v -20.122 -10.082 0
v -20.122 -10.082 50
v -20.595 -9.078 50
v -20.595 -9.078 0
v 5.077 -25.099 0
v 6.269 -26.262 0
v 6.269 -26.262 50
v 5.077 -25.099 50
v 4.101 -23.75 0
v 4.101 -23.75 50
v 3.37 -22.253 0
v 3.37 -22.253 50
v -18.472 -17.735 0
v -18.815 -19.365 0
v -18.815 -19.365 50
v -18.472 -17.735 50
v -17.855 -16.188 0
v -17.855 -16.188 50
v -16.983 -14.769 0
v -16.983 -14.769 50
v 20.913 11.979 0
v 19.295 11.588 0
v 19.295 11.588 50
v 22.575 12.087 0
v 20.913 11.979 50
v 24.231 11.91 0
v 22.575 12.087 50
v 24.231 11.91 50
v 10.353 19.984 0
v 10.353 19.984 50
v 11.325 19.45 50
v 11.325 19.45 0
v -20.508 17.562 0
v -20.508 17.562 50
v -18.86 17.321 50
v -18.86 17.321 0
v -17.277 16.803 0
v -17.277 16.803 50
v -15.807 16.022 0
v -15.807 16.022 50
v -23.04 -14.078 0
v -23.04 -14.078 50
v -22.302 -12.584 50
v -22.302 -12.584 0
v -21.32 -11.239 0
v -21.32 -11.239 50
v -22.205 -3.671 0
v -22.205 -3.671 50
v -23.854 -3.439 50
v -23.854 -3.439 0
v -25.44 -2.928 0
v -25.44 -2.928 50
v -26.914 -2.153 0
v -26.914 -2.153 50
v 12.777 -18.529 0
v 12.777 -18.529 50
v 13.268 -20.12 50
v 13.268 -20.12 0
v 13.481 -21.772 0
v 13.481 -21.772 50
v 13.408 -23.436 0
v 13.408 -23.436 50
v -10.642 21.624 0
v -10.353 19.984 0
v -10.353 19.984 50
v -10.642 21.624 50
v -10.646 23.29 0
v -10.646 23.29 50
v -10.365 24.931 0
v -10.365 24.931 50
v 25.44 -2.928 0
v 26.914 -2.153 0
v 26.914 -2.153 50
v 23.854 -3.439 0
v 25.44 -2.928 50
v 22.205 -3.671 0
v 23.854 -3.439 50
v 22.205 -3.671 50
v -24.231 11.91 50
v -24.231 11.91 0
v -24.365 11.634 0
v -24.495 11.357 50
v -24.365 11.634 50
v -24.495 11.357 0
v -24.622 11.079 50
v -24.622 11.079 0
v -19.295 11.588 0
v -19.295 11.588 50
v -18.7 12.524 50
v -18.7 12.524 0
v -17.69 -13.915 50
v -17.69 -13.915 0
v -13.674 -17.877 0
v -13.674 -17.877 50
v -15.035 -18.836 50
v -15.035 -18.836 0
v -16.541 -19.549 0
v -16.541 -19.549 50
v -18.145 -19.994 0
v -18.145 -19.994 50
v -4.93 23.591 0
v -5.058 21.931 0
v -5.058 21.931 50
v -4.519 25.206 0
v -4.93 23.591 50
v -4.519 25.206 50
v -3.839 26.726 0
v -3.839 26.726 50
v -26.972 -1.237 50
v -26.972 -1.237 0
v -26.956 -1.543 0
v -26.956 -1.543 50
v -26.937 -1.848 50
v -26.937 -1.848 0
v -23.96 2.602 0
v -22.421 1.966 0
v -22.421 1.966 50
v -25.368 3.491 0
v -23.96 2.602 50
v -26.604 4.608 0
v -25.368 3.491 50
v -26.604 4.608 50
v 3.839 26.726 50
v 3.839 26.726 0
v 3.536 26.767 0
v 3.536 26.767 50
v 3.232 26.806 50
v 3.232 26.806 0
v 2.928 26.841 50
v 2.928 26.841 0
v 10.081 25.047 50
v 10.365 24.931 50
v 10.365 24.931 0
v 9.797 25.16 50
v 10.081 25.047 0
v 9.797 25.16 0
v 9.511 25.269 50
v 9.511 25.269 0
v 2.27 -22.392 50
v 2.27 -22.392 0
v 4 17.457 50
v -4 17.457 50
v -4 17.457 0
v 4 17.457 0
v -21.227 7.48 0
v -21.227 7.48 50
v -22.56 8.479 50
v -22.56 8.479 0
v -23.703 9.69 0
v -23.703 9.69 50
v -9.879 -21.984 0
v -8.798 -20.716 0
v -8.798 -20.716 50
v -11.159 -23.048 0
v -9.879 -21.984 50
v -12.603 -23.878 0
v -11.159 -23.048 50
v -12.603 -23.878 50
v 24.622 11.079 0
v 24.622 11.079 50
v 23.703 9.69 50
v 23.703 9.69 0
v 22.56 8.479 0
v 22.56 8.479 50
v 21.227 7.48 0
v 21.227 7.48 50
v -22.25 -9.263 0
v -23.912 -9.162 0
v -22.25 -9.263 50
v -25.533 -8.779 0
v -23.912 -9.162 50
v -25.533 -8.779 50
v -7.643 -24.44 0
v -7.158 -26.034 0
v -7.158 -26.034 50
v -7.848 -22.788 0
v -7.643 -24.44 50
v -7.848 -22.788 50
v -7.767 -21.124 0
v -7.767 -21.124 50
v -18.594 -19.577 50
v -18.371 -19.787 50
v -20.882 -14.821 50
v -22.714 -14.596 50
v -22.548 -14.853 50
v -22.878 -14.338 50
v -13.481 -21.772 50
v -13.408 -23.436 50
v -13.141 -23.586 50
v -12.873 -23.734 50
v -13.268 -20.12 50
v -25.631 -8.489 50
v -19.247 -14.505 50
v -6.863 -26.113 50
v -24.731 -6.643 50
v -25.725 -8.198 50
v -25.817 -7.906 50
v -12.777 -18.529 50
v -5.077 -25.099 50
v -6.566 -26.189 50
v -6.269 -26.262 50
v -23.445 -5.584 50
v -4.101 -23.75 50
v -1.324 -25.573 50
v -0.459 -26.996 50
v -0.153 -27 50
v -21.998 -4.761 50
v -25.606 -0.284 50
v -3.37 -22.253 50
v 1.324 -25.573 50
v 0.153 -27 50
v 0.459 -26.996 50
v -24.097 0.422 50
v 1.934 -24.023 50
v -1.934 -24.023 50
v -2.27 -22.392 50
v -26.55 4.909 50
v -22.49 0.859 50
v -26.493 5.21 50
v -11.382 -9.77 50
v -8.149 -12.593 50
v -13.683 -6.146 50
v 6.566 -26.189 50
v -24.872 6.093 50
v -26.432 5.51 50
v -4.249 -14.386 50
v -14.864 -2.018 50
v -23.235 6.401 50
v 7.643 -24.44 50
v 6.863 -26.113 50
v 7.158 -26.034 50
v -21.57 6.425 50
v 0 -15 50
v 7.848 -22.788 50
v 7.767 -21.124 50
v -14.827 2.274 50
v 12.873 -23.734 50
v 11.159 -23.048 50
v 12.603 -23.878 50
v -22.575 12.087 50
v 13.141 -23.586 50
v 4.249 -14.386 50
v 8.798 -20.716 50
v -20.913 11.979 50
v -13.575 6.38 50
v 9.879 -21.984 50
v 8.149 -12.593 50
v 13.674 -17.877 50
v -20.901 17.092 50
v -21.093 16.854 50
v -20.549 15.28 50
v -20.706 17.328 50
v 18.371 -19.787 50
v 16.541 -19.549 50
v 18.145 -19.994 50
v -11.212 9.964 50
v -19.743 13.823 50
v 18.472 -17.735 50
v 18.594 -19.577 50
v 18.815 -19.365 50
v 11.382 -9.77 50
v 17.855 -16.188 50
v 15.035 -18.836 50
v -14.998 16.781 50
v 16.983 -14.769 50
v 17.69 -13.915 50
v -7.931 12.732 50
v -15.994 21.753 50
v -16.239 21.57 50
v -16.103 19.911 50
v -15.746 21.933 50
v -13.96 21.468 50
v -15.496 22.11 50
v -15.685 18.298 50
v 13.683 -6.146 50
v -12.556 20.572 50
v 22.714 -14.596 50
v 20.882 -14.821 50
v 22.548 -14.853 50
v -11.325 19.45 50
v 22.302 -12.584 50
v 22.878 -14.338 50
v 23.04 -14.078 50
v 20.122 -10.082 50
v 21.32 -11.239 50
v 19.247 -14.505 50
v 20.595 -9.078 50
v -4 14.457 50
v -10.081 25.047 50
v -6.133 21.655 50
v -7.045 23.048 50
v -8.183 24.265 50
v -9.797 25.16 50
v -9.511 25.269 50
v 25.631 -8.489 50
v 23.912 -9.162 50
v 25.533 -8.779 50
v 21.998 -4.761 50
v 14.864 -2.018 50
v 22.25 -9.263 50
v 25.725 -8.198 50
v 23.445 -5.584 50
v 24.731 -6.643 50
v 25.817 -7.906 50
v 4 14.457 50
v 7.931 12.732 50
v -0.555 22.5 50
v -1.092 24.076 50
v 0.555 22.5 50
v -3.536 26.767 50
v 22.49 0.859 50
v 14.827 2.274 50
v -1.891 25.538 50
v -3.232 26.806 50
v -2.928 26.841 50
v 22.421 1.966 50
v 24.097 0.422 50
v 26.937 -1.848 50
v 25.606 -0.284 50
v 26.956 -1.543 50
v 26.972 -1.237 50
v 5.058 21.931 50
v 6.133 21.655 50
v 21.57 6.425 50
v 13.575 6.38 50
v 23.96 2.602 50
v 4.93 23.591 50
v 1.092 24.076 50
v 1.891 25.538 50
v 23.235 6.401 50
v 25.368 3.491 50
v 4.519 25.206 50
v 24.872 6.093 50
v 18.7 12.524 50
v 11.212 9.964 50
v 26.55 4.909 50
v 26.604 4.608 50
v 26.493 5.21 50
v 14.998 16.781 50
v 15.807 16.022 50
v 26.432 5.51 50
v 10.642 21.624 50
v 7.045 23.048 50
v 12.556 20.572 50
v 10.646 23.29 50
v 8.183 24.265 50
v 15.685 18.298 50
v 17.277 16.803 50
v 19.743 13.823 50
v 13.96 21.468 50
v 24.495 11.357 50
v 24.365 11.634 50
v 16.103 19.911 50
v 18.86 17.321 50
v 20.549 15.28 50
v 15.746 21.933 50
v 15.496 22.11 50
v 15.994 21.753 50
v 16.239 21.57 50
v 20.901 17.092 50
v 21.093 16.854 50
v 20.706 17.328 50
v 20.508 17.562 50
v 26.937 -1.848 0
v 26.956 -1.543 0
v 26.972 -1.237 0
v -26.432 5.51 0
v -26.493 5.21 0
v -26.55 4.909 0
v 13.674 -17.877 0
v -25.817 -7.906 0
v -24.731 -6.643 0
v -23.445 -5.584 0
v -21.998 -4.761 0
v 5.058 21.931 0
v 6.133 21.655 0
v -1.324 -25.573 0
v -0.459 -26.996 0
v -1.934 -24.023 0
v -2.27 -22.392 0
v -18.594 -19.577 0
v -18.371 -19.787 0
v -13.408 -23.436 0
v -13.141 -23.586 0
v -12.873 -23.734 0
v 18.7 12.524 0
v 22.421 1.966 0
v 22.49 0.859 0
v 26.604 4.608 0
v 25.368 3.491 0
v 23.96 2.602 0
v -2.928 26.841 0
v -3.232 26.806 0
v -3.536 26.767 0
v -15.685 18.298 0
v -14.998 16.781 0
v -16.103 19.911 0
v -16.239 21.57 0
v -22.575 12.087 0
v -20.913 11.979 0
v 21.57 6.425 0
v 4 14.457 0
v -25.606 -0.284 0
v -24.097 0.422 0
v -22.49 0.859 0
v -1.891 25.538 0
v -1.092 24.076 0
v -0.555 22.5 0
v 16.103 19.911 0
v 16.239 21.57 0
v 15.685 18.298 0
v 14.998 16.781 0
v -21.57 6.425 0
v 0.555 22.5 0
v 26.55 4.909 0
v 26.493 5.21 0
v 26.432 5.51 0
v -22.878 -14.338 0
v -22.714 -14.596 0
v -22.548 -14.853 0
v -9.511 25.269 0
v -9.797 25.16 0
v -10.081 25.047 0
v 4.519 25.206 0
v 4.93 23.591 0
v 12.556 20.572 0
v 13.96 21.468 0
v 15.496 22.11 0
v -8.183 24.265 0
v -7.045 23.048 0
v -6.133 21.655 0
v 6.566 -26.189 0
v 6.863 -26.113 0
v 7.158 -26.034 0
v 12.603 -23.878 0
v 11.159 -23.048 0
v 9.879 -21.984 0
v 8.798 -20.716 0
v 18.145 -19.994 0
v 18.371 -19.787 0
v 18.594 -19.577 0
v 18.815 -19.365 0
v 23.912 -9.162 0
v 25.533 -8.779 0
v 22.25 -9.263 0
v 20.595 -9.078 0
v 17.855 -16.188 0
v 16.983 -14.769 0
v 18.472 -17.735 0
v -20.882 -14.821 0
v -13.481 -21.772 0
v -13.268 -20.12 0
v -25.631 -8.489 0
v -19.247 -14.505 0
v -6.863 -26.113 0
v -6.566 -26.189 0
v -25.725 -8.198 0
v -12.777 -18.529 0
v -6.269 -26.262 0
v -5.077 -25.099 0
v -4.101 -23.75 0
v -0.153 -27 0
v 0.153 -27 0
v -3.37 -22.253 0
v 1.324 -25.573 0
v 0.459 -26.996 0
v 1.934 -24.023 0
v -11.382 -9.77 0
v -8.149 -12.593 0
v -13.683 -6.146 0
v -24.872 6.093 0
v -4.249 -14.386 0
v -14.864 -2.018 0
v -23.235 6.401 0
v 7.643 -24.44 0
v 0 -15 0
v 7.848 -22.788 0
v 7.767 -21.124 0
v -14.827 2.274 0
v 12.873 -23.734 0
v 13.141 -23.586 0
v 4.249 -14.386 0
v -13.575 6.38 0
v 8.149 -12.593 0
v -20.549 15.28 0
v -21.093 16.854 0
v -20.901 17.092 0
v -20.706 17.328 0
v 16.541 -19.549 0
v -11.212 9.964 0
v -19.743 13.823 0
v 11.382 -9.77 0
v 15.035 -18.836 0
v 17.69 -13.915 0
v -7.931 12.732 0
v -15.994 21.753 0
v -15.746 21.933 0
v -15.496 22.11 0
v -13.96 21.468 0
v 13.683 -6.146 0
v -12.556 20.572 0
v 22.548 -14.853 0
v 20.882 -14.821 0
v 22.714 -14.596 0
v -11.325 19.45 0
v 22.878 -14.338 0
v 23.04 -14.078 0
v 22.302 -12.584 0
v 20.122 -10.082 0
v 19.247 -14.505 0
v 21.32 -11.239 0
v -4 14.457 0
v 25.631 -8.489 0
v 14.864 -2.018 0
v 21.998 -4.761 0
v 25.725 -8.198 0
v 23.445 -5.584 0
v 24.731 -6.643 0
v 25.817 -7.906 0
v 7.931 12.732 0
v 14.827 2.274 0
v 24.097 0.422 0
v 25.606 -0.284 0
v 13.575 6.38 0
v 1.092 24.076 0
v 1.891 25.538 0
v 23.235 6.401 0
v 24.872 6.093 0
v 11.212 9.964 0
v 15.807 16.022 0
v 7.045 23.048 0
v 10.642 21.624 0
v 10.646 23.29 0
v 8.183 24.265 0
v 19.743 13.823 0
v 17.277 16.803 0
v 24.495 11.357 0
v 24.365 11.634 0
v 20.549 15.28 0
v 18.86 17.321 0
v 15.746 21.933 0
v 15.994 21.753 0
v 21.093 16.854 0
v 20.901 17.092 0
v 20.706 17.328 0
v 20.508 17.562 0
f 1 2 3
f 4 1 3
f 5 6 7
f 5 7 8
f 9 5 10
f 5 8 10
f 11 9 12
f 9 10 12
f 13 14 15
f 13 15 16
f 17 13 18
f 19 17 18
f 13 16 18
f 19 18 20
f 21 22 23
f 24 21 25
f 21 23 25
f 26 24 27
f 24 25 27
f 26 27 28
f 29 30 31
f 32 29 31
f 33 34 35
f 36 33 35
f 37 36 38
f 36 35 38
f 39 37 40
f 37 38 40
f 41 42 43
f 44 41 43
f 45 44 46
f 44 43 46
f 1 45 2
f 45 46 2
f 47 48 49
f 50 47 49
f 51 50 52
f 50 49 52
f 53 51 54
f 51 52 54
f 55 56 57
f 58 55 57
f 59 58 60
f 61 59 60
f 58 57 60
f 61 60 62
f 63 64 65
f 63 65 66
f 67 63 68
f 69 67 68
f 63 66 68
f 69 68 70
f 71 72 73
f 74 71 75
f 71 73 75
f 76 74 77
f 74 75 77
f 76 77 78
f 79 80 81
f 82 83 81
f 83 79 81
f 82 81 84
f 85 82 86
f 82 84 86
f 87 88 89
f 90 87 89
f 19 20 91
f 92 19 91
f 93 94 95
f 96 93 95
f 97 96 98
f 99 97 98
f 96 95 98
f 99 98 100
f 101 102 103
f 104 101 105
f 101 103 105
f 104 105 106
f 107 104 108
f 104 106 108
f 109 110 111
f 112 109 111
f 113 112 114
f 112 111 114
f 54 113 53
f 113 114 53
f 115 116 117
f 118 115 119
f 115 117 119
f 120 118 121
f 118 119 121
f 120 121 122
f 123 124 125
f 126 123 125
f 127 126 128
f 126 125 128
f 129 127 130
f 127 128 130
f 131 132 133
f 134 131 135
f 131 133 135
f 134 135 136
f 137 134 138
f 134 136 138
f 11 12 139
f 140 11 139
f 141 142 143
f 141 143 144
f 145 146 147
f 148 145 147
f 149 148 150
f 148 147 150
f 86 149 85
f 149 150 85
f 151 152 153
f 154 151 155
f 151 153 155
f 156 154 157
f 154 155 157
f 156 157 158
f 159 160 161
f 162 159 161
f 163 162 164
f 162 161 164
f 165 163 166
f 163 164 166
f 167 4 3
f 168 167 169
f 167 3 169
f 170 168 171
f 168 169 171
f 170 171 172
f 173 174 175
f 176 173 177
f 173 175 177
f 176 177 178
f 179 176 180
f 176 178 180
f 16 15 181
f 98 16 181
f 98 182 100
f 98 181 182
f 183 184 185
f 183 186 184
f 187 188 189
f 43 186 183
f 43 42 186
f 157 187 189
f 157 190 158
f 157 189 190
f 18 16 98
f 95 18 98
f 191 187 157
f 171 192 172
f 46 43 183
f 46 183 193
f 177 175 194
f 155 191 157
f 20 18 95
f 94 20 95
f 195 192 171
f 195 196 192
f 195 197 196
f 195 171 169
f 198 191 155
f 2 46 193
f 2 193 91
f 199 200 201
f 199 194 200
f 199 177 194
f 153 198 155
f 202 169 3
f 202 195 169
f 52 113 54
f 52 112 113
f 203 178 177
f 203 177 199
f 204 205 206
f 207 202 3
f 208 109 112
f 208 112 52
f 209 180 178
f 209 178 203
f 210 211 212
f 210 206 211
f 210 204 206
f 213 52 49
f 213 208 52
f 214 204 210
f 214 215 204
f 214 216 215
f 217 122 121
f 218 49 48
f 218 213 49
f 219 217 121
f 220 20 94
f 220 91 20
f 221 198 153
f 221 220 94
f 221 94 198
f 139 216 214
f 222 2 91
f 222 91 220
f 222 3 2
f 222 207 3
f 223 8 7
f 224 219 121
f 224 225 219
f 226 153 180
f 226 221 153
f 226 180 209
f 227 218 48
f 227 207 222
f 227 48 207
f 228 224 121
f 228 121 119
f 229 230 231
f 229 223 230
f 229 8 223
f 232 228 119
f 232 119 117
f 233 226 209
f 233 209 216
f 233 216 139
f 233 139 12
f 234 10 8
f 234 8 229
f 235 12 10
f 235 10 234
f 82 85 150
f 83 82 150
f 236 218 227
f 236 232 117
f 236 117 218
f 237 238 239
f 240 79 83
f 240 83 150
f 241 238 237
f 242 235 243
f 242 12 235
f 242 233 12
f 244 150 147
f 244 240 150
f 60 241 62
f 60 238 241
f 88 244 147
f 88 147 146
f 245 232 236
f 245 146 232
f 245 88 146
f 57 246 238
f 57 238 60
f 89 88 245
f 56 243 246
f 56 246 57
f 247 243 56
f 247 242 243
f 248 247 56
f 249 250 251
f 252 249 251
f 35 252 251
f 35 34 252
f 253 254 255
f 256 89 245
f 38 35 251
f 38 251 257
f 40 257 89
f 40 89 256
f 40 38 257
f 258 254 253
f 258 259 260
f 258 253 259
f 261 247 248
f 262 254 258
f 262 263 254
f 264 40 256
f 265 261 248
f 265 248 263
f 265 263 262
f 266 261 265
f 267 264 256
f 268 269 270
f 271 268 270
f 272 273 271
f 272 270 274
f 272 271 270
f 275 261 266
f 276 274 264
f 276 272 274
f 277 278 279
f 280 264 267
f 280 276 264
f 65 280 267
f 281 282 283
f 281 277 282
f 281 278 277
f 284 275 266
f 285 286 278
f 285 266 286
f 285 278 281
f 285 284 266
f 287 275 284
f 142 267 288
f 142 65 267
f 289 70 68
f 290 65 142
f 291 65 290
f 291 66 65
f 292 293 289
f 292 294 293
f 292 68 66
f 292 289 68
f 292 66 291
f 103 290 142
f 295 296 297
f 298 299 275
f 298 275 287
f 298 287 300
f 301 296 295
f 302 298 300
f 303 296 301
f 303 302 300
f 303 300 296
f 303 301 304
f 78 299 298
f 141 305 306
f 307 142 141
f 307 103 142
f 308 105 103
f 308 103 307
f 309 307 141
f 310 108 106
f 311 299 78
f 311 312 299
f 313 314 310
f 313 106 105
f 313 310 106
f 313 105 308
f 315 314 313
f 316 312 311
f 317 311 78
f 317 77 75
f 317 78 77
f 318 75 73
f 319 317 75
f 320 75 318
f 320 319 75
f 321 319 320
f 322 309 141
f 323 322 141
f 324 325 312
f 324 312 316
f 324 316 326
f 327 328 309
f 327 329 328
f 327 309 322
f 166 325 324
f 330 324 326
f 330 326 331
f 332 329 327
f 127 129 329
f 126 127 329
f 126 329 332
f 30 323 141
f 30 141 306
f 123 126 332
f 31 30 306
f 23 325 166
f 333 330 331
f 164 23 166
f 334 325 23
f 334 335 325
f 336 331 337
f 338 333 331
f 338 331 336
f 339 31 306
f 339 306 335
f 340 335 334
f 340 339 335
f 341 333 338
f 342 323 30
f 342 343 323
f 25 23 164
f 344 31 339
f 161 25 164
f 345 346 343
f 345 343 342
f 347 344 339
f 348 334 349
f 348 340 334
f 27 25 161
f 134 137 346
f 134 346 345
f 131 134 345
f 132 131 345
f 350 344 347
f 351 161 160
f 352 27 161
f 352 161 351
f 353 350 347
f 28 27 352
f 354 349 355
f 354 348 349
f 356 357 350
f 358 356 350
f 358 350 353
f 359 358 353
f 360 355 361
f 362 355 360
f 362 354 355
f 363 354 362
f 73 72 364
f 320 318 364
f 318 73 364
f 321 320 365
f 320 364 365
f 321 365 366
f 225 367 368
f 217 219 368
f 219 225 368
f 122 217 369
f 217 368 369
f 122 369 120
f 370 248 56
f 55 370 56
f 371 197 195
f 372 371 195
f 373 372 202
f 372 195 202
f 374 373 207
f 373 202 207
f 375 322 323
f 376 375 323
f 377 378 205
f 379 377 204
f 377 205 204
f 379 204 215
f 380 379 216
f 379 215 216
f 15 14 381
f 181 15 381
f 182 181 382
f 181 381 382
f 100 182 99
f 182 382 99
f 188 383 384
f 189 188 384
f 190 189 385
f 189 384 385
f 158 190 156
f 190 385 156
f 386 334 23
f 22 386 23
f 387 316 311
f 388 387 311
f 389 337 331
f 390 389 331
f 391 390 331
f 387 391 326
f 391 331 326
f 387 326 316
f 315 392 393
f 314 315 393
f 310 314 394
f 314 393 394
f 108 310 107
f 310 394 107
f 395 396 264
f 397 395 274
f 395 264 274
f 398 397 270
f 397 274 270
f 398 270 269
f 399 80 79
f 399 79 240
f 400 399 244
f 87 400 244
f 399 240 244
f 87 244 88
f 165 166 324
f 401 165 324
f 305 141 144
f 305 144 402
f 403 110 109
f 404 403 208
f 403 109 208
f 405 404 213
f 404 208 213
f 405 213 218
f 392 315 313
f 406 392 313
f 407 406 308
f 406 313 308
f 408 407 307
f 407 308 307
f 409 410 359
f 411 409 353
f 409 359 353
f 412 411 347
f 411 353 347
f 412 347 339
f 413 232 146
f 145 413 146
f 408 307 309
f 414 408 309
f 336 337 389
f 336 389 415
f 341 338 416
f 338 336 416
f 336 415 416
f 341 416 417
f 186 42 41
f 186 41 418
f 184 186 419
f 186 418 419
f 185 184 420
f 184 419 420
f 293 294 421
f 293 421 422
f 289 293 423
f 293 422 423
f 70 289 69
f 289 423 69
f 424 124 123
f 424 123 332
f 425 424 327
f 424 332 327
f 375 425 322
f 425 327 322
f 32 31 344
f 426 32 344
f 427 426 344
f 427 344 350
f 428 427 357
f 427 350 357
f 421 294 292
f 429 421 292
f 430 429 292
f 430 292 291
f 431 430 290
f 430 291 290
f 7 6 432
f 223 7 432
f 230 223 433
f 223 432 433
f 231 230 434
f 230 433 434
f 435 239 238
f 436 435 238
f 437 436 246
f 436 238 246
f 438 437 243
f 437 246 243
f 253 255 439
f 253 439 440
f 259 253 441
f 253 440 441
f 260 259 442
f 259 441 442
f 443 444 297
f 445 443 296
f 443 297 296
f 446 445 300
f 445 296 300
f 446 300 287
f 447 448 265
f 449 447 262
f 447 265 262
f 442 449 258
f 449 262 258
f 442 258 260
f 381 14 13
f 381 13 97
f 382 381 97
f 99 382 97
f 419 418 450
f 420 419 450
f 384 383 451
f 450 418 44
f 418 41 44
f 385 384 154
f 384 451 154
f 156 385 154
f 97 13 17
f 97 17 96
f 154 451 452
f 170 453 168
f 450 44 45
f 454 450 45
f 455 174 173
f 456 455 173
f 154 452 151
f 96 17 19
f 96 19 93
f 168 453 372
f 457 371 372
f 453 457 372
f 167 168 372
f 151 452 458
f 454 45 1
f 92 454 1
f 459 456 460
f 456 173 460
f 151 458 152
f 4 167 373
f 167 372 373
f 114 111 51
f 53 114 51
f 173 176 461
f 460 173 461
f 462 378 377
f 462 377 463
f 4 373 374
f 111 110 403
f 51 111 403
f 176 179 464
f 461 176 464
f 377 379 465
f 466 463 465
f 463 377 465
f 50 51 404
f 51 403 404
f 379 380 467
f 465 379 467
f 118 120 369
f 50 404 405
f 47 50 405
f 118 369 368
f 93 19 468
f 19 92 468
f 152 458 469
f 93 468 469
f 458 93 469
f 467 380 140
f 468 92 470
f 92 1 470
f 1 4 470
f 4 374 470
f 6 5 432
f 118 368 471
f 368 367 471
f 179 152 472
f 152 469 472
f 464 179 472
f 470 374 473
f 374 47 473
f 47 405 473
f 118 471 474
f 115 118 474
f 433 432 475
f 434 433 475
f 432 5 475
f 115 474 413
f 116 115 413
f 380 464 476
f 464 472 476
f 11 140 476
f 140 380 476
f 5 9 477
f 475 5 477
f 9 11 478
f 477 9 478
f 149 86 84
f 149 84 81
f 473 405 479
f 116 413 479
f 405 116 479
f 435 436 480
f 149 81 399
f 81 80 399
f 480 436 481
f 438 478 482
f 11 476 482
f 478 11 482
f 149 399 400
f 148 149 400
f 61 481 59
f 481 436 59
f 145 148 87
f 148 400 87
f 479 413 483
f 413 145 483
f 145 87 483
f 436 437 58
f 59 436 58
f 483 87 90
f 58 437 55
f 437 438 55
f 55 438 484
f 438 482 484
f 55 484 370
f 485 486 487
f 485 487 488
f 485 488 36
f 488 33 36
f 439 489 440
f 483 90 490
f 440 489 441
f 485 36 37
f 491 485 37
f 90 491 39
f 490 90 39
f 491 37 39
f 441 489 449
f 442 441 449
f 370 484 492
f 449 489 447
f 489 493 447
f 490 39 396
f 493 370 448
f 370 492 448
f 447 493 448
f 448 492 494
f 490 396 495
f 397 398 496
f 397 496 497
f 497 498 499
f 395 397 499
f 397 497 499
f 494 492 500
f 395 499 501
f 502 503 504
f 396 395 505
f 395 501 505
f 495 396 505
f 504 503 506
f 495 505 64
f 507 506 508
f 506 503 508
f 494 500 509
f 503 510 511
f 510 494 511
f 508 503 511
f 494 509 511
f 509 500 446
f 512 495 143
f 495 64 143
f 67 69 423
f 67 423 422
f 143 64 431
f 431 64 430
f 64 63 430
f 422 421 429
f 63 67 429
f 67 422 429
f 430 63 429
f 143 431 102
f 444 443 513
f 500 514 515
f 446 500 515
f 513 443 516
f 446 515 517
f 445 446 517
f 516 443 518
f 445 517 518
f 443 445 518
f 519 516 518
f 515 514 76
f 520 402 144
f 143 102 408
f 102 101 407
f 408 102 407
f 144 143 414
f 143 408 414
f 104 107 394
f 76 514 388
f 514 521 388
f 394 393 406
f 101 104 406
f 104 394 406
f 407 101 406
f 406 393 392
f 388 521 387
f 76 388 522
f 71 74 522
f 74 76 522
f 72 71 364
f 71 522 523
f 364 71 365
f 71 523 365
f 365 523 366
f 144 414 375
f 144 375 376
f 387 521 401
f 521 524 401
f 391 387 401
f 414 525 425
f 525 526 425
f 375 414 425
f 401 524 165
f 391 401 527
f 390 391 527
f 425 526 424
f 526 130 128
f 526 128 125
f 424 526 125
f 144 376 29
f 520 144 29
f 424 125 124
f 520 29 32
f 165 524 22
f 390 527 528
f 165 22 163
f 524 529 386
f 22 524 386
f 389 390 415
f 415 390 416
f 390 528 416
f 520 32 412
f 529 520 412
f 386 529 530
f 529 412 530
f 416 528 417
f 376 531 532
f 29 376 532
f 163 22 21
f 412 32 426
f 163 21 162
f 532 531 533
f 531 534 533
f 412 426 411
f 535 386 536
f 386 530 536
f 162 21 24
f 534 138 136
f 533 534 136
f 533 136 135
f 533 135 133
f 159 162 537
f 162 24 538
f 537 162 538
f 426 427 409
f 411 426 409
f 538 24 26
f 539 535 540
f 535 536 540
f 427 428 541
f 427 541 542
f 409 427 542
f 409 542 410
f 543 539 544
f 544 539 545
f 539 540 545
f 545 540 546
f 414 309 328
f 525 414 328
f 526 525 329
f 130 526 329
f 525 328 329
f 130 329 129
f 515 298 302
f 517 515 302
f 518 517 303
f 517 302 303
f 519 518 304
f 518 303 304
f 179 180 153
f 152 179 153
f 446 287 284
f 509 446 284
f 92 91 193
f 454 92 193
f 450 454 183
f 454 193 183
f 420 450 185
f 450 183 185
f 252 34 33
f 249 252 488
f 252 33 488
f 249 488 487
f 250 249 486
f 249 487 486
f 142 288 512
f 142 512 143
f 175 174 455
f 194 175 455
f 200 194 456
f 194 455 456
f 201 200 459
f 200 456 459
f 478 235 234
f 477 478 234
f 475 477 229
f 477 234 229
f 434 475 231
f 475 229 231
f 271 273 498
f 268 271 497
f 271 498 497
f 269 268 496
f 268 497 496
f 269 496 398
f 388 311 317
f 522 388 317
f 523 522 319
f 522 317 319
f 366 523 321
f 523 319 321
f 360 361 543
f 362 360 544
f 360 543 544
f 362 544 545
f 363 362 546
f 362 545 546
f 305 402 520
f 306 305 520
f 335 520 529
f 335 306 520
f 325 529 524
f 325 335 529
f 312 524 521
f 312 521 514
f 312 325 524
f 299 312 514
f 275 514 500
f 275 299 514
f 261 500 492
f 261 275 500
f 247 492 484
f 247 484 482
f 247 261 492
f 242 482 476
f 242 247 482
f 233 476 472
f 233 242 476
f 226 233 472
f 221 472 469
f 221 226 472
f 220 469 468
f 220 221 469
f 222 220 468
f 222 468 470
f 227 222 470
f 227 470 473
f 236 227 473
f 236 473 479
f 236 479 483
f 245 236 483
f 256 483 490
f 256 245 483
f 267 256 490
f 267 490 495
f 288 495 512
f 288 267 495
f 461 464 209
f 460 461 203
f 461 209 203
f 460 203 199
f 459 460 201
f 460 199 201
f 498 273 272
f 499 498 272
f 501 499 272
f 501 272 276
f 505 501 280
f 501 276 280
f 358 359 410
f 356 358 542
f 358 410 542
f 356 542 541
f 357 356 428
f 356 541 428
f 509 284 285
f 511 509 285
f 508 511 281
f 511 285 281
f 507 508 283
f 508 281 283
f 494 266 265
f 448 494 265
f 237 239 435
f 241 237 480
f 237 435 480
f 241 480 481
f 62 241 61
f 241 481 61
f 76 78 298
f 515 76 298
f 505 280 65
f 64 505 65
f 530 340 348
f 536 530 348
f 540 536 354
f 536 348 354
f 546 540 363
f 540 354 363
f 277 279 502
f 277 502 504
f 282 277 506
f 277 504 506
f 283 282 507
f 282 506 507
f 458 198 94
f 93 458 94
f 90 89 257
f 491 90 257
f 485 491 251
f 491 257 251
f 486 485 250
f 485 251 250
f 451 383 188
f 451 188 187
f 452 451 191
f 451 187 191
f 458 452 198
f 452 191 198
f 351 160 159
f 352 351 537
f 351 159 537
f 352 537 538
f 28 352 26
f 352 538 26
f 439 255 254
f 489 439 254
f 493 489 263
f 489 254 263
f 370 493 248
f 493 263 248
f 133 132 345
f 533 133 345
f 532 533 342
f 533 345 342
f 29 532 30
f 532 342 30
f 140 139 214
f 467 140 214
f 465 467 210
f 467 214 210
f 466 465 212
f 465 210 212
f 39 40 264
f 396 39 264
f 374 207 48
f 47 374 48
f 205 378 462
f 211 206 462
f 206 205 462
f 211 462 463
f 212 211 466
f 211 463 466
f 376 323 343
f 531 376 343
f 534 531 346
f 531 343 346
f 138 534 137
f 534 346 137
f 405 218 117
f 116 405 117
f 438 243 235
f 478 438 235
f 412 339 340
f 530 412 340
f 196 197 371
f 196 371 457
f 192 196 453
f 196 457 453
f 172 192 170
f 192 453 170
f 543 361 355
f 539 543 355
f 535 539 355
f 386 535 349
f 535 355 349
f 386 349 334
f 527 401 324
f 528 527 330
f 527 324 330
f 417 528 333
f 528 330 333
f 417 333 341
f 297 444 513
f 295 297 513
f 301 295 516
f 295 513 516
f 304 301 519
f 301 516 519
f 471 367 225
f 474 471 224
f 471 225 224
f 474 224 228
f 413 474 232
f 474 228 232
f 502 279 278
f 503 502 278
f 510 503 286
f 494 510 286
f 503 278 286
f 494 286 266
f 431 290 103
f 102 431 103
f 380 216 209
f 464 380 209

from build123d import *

# Parameters (mm, degrees)
SKETCH1_R           = 27
BOSS_EXTRUDE1_DEPTH = 50
CUT_EXTRUDE1_DEPTH  = 50
CIRPATTERN1_COUNT   = 25
CUT_EXTRUDE2_DEPTH  = 50


with BuildPart() as part:
    # Sketch1 → Boss-Extrude1 (new body)
    with BuildSketch(Plane.XY):
        Circle(SKETCH1_R)
    extrude(amount=BOSS_EXTRUDE1_DEPTH)

    # Sketch3 → Cut-Extrude1 (cut)
    with BuildSketch(Plane.XY.offset(50)):
        with BuildLine():
            Line((3.082235405, 27), (-3.082235405, 27))
            ThreePointArc((-3.082235405, 27), (-1.513981077, 24.920996669), (-0.55457938, 22.5))
            Line((-0.55457938, 22.5), (0.55457938, 22.5))
            ThreePointArc((0.55457938, 22.5), (1.513981077, 24.920996669), (3.082235405, 27))
        make_face()
    cut_extrude1 = extrude(amount=-CUT_EXTRUDE1_DEPTH, mode=Mode.SUBTRACT)

    # CirPattern1: Cut-Extrude1 ×25 about axis
    cirpattern1_axis = Axis((0, 0, 0), (0, 0, 1))
    for i in range(1, CIRPATTERN1_COUNT):
        add(cut_extrude1.rotate(cirpattern1_axis, i * 360 / CIRPATTERN1_COUNT), mode=Mode.SUBTRACT)

    # Sketch4 → Cut-Extrude2 (cut)
    with BuildSketch(Plane.XY.offset(50)):
        with BuildLine():
            Line((-4, 14.456832295), (-4, 17.456832295))
            Line((-4, 17.456832295), (4, 17.456832295))
            Line((4, 17.456832295), (4, 14.456832295))
            ThreePointArc((4, 14.456832295), (0, -15), (-4, 14.456832295))
        make_face()
    extrude(amount=-CUT_EXTRUDE2_DEPTH, mode=Mode.SUBTRACT)


solid = part.part
